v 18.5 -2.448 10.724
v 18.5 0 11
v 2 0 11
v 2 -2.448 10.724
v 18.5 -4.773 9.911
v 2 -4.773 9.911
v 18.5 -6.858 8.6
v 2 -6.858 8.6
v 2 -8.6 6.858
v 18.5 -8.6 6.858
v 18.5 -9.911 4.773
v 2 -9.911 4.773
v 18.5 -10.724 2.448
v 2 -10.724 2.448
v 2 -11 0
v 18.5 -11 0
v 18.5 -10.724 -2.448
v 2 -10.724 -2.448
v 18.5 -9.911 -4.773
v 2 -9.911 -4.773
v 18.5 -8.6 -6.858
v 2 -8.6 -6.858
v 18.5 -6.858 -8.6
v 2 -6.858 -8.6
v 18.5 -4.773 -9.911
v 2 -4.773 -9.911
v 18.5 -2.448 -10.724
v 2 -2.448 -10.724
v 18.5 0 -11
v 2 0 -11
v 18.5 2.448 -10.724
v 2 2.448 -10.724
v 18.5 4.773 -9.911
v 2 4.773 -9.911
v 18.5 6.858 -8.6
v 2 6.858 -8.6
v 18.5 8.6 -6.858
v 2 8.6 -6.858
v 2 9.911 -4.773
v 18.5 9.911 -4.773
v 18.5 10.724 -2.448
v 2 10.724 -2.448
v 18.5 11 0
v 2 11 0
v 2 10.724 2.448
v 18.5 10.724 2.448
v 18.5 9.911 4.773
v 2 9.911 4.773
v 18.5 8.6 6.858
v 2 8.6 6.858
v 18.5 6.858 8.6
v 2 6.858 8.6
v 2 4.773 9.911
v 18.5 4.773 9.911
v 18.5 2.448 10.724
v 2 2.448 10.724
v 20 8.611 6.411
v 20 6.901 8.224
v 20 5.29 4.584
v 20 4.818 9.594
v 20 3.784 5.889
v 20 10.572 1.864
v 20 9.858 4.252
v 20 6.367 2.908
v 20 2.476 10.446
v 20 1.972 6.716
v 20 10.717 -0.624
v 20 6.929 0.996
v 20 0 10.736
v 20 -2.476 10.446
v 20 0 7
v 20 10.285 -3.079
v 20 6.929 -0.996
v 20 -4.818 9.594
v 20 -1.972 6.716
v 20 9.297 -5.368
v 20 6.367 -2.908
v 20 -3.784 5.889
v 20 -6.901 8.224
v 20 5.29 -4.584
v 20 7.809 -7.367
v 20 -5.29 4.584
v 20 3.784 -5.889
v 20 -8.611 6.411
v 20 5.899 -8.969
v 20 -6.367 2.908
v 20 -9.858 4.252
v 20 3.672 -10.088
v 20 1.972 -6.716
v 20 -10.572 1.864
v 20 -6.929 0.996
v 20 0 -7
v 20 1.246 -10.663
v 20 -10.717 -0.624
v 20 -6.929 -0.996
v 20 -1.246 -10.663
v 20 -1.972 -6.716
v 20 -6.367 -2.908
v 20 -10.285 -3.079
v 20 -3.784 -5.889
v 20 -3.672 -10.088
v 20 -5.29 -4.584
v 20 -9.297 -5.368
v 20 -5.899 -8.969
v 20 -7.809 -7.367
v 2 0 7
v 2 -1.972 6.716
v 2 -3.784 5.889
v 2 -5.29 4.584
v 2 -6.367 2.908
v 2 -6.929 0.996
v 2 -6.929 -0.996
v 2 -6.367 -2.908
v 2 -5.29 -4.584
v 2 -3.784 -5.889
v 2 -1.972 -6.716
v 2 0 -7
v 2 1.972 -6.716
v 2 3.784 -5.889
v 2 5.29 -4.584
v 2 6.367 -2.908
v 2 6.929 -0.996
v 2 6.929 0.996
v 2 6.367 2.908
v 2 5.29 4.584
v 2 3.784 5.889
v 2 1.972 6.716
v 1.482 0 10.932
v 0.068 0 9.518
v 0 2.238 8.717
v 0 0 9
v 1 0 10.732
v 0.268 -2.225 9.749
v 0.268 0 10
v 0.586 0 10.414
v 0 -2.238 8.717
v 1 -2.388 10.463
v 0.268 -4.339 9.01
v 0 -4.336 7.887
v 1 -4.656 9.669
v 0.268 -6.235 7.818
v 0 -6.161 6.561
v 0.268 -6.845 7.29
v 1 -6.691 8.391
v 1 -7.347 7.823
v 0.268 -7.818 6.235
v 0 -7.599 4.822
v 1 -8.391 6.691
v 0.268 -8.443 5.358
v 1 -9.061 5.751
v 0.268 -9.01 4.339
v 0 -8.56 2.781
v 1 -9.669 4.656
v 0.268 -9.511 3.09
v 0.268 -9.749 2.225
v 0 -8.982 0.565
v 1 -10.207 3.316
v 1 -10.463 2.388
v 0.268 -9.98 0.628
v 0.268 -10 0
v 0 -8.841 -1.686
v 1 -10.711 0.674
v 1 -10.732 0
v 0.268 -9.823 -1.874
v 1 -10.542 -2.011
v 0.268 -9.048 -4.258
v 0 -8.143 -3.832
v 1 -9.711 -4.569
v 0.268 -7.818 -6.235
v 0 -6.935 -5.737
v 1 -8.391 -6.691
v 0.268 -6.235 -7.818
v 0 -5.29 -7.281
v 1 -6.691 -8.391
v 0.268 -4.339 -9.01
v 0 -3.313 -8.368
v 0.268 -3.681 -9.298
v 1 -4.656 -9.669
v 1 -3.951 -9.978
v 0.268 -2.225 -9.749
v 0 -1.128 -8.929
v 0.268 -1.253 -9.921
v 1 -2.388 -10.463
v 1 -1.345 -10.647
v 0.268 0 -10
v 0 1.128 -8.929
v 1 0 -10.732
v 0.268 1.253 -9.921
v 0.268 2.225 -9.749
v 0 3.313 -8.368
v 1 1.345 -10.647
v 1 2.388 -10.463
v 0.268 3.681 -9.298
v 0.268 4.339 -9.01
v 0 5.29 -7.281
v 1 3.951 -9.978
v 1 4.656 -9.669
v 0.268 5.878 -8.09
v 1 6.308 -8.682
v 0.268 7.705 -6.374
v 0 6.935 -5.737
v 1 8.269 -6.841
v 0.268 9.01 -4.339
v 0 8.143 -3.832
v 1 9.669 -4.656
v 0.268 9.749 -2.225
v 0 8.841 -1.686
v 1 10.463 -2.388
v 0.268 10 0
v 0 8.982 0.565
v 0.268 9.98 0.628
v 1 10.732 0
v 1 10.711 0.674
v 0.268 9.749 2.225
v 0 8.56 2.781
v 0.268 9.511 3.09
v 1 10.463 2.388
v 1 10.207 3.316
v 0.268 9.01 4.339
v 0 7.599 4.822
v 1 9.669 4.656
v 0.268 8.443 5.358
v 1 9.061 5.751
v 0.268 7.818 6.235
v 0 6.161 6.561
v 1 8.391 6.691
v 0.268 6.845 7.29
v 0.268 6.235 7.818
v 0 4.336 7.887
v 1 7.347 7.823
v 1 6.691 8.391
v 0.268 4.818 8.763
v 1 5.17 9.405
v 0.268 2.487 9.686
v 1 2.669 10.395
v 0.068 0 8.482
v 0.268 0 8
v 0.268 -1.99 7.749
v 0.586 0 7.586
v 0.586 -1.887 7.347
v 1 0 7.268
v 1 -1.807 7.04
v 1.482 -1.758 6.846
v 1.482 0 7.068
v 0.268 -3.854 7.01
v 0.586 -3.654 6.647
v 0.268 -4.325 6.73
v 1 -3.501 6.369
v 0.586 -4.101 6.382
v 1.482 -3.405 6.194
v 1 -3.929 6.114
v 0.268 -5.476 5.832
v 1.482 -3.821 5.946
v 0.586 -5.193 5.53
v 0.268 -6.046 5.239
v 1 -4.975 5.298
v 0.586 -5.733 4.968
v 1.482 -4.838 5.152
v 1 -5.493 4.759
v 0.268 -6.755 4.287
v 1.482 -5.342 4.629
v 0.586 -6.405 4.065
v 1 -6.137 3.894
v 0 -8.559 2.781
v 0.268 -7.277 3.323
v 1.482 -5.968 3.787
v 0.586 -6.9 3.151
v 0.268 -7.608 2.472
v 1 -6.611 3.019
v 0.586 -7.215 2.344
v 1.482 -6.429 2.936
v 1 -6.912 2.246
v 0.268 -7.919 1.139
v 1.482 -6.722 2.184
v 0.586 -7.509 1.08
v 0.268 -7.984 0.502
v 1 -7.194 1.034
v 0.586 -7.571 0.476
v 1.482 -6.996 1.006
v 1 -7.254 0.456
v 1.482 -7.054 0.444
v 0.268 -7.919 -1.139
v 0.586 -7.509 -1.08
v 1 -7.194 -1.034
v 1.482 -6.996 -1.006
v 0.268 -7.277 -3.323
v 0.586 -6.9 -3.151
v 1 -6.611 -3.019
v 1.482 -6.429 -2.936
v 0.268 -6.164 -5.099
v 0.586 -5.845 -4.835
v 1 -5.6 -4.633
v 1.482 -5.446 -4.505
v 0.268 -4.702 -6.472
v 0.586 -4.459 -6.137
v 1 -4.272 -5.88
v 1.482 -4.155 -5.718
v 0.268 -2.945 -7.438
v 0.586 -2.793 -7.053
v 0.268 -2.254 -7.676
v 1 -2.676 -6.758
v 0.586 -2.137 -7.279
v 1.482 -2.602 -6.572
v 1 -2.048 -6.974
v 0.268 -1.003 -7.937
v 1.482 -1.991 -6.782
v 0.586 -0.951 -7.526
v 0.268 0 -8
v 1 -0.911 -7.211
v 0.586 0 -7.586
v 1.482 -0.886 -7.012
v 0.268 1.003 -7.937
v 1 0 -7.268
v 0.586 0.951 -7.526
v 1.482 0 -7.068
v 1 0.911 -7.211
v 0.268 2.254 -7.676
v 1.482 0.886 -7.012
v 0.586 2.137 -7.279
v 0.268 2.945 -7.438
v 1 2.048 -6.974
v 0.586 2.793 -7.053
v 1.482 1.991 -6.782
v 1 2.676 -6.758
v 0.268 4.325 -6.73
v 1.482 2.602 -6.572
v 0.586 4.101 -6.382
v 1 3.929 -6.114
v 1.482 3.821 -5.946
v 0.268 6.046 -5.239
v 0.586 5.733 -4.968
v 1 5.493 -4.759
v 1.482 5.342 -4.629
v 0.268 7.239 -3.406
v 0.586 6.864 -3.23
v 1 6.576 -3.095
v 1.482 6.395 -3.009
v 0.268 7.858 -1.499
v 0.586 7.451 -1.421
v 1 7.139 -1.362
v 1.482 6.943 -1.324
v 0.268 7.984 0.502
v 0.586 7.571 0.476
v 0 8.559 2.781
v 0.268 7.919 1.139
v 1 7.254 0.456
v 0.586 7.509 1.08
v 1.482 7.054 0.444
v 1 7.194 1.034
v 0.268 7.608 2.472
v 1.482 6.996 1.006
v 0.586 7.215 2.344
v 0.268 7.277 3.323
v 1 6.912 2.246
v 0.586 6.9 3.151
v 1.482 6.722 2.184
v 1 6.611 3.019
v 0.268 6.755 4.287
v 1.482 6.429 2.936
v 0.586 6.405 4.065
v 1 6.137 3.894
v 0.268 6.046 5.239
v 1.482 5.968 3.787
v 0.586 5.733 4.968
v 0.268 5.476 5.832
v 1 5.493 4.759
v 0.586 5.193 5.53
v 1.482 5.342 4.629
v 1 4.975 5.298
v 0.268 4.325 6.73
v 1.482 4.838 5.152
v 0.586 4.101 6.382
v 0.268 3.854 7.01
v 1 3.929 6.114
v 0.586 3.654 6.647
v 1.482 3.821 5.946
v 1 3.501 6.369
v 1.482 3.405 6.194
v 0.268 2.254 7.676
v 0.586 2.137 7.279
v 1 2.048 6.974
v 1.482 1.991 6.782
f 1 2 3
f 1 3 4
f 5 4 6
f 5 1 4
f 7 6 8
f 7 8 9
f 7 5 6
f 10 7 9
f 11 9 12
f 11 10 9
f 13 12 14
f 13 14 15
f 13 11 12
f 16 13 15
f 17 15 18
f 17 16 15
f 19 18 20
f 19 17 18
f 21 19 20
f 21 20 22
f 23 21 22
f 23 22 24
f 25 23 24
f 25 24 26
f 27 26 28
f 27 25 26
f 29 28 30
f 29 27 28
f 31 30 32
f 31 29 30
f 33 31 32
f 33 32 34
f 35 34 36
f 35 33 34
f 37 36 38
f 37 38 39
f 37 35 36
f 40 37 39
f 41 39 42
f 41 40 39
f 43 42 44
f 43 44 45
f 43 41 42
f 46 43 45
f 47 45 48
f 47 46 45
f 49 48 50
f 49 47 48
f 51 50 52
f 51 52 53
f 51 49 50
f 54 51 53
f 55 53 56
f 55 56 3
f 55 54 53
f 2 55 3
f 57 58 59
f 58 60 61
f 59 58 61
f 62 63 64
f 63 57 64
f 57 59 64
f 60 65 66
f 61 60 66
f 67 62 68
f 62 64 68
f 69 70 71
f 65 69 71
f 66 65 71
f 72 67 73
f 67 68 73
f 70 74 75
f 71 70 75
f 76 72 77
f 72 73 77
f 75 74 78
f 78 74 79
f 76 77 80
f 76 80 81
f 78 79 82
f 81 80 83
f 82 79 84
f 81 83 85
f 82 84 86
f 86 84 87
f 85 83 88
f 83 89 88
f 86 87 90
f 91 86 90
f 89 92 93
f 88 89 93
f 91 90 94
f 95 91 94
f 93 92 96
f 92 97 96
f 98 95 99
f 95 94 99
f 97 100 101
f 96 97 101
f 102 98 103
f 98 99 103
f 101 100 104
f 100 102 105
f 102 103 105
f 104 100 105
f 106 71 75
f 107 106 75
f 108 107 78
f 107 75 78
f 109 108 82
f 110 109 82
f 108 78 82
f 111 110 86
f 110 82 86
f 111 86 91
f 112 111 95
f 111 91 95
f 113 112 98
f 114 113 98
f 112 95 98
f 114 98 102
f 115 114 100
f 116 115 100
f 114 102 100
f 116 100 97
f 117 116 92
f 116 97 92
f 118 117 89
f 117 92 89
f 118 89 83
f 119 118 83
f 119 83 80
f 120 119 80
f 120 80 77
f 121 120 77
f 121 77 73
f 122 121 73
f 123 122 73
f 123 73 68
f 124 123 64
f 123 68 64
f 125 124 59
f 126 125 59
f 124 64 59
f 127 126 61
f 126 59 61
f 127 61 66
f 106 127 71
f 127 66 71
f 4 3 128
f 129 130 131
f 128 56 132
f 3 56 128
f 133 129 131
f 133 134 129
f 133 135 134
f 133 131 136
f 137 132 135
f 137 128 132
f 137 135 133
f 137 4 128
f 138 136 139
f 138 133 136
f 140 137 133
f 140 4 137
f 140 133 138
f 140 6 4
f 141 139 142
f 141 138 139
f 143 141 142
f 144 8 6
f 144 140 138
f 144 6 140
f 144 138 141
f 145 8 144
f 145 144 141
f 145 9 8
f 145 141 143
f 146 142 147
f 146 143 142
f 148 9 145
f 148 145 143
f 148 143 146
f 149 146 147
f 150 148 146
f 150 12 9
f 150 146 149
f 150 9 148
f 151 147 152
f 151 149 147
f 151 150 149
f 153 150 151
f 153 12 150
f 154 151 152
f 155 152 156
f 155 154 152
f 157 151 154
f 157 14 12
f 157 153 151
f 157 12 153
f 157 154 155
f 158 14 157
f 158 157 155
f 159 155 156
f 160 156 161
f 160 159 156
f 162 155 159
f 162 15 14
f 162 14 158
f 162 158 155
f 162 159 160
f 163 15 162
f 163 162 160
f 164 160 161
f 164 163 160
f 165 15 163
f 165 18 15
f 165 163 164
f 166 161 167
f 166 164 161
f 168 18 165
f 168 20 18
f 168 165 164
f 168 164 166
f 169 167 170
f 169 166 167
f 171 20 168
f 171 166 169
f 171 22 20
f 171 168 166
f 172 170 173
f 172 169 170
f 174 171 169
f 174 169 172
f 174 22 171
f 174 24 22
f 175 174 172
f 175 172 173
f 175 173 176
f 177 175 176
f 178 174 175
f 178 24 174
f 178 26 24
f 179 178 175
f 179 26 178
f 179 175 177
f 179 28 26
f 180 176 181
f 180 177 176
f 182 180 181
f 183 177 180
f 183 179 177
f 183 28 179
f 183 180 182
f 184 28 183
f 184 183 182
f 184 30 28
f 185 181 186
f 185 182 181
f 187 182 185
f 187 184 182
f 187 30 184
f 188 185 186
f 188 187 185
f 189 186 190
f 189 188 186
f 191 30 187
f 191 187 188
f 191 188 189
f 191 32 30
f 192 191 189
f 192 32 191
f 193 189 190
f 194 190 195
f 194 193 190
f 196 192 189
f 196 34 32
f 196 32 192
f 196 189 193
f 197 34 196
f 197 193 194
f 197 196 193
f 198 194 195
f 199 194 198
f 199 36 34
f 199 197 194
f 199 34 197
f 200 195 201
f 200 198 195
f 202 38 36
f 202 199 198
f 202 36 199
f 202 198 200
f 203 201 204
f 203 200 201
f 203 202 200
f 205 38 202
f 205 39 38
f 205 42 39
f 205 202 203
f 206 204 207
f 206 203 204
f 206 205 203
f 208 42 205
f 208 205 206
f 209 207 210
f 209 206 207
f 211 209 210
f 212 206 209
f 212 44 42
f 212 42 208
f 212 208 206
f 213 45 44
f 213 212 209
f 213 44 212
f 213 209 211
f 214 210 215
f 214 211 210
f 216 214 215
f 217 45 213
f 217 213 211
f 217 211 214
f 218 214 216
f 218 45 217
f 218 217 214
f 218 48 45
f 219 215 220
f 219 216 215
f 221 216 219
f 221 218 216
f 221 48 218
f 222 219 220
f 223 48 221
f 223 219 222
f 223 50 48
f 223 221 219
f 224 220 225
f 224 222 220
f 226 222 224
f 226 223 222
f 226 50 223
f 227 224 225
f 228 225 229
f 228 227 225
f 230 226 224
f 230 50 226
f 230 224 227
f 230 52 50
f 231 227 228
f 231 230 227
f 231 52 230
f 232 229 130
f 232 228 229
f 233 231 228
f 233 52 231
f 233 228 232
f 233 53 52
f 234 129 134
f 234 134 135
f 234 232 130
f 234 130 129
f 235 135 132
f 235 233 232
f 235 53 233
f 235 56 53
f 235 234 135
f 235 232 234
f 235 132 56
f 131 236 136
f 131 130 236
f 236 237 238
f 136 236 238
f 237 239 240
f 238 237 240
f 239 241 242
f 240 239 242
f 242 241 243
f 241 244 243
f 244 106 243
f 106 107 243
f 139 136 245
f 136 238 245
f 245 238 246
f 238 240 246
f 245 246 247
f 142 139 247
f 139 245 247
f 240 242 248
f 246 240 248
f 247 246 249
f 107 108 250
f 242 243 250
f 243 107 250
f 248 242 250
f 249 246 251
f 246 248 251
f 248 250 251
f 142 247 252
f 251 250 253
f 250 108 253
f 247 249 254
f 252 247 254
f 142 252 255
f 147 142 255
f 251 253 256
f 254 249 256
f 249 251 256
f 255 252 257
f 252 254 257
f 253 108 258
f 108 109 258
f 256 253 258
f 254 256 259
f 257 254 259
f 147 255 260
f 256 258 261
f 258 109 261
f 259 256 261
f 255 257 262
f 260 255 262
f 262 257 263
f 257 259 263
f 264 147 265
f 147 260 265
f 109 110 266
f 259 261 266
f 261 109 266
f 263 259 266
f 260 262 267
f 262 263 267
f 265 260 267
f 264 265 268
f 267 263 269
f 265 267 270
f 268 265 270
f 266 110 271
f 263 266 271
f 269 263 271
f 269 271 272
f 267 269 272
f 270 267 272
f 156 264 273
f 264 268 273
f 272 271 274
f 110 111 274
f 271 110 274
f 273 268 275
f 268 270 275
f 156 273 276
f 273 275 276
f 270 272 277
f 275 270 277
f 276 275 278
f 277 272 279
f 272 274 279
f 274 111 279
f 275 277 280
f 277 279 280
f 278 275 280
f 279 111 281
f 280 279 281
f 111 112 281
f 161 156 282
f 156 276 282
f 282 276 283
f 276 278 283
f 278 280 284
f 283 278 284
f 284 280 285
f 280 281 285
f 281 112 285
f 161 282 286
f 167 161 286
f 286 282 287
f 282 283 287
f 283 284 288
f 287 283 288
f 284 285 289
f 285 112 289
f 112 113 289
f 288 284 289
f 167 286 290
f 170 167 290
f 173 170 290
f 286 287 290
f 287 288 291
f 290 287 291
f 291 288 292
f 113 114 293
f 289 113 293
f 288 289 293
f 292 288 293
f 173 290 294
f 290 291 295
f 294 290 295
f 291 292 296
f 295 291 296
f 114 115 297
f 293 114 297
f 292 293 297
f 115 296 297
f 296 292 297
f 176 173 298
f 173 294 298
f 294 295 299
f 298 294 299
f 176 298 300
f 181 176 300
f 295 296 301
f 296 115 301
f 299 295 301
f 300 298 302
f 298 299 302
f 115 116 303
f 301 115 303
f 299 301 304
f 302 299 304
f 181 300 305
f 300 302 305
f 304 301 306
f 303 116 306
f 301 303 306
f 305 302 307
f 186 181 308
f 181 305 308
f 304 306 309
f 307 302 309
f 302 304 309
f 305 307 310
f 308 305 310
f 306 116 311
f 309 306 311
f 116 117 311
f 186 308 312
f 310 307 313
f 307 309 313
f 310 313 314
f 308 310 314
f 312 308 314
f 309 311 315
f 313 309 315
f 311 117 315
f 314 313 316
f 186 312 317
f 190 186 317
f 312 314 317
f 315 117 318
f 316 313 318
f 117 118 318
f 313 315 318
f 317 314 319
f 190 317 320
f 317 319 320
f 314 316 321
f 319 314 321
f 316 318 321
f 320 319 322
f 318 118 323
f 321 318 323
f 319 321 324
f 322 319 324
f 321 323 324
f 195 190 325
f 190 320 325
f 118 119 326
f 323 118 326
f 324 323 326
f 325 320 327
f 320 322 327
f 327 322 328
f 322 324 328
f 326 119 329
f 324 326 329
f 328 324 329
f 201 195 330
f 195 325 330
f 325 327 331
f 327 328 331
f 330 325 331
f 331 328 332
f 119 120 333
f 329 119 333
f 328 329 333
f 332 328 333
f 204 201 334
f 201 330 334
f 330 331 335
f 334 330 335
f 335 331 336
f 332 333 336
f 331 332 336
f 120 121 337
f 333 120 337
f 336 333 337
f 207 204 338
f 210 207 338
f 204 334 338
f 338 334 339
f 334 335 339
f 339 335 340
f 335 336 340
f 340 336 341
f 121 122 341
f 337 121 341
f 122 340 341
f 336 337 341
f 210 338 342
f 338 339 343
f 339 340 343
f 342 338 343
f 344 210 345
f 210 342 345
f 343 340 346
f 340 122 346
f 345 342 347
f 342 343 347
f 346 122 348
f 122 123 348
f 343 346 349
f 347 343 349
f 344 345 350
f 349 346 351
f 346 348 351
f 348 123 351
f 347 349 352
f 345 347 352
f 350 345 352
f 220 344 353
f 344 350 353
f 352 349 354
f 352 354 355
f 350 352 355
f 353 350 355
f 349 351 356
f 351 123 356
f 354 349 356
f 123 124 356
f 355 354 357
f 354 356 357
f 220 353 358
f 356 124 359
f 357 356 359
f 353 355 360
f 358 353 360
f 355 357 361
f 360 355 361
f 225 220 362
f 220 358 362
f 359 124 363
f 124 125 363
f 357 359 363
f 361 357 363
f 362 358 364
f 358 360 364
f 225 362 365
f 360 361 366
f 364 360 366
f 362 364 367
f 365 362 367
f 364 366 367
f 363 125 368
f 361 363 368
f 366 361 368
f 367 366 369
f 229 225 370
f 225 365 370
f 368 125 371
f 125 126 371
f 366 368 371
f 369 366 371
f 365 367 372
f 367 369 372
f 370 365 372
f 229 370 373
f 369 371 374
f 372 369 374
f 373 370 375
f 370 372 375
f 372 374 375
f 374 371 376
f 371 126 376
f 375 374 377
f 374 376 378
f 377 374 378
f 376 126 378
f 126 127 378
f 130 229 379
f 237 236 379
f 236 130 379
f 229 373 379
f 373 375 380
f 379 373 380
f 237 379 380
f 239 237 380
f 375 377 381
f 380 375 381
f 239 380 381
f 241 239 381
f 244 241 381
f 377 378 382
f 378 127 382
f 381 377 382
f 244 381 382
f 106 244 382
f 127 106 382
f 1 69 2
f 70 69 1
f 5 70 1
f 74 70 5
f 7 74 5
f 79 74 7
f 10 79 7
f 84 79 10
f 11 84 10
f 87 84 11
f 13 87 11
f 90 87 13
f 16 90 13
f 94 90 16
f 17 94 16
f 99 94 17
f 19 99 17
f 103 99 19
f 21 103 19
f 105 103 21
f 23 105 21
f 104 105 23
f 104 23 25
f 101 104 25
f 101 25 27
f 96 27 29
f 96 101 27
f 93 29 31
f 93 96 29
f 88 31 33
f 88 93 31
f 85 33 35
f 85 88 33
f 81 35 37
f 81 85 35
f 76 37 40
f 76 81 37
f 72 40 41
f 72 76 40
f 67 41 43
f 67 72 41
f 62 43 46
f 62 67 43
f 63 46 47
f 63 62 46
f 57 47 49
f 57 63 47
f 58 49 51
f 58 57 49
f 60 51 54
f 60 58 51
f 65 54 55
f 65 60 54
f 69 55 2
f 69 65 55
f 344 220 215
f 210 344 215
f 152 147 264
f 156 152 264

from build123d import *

# Parameters (mm, degrees)
F0_W = 20
F0_H = 4
F4_R = 1.99999


# Not quite as in the source:
# - a fillet or chamfer is up to 0.001 mm smaller than in the source, because OpenCascade refuses the exact size


with BuildPart() as f1:
    # F0 (on Front) → F1 (revolve)
    with BuildSketch(Plane.XZ):
        with Locations((10, 9)):
            Rectangle(F0_W, F0_H)
    revolve(axis=Axis((12.6487514935, 0, 0), (1, 0, 0)))

    # F2 (on Front) → F3 (revolve, cut)
    with BuildSketch(Plane.XZ):
        Polygon((24, 11.9697983939), (13, 11.9697983939), (24, 10.0302016061), align=None)
    revolve(axis=Axis((11.270377785, 0, 0), (1, 0, 0)), mode=Mode.SUBTRACT)

    # F4 (radius 2 in the source; OpenCascade refuses exactly that, so slightly less here)
    f4_edges = [f1.edges().sort_by_distance(p)[0] for p in [
        (0, 0, -11),
        (0, 0, -7),
    ]]
    fillet(f4_edges, radius=F4_R)


solid = f1.part
